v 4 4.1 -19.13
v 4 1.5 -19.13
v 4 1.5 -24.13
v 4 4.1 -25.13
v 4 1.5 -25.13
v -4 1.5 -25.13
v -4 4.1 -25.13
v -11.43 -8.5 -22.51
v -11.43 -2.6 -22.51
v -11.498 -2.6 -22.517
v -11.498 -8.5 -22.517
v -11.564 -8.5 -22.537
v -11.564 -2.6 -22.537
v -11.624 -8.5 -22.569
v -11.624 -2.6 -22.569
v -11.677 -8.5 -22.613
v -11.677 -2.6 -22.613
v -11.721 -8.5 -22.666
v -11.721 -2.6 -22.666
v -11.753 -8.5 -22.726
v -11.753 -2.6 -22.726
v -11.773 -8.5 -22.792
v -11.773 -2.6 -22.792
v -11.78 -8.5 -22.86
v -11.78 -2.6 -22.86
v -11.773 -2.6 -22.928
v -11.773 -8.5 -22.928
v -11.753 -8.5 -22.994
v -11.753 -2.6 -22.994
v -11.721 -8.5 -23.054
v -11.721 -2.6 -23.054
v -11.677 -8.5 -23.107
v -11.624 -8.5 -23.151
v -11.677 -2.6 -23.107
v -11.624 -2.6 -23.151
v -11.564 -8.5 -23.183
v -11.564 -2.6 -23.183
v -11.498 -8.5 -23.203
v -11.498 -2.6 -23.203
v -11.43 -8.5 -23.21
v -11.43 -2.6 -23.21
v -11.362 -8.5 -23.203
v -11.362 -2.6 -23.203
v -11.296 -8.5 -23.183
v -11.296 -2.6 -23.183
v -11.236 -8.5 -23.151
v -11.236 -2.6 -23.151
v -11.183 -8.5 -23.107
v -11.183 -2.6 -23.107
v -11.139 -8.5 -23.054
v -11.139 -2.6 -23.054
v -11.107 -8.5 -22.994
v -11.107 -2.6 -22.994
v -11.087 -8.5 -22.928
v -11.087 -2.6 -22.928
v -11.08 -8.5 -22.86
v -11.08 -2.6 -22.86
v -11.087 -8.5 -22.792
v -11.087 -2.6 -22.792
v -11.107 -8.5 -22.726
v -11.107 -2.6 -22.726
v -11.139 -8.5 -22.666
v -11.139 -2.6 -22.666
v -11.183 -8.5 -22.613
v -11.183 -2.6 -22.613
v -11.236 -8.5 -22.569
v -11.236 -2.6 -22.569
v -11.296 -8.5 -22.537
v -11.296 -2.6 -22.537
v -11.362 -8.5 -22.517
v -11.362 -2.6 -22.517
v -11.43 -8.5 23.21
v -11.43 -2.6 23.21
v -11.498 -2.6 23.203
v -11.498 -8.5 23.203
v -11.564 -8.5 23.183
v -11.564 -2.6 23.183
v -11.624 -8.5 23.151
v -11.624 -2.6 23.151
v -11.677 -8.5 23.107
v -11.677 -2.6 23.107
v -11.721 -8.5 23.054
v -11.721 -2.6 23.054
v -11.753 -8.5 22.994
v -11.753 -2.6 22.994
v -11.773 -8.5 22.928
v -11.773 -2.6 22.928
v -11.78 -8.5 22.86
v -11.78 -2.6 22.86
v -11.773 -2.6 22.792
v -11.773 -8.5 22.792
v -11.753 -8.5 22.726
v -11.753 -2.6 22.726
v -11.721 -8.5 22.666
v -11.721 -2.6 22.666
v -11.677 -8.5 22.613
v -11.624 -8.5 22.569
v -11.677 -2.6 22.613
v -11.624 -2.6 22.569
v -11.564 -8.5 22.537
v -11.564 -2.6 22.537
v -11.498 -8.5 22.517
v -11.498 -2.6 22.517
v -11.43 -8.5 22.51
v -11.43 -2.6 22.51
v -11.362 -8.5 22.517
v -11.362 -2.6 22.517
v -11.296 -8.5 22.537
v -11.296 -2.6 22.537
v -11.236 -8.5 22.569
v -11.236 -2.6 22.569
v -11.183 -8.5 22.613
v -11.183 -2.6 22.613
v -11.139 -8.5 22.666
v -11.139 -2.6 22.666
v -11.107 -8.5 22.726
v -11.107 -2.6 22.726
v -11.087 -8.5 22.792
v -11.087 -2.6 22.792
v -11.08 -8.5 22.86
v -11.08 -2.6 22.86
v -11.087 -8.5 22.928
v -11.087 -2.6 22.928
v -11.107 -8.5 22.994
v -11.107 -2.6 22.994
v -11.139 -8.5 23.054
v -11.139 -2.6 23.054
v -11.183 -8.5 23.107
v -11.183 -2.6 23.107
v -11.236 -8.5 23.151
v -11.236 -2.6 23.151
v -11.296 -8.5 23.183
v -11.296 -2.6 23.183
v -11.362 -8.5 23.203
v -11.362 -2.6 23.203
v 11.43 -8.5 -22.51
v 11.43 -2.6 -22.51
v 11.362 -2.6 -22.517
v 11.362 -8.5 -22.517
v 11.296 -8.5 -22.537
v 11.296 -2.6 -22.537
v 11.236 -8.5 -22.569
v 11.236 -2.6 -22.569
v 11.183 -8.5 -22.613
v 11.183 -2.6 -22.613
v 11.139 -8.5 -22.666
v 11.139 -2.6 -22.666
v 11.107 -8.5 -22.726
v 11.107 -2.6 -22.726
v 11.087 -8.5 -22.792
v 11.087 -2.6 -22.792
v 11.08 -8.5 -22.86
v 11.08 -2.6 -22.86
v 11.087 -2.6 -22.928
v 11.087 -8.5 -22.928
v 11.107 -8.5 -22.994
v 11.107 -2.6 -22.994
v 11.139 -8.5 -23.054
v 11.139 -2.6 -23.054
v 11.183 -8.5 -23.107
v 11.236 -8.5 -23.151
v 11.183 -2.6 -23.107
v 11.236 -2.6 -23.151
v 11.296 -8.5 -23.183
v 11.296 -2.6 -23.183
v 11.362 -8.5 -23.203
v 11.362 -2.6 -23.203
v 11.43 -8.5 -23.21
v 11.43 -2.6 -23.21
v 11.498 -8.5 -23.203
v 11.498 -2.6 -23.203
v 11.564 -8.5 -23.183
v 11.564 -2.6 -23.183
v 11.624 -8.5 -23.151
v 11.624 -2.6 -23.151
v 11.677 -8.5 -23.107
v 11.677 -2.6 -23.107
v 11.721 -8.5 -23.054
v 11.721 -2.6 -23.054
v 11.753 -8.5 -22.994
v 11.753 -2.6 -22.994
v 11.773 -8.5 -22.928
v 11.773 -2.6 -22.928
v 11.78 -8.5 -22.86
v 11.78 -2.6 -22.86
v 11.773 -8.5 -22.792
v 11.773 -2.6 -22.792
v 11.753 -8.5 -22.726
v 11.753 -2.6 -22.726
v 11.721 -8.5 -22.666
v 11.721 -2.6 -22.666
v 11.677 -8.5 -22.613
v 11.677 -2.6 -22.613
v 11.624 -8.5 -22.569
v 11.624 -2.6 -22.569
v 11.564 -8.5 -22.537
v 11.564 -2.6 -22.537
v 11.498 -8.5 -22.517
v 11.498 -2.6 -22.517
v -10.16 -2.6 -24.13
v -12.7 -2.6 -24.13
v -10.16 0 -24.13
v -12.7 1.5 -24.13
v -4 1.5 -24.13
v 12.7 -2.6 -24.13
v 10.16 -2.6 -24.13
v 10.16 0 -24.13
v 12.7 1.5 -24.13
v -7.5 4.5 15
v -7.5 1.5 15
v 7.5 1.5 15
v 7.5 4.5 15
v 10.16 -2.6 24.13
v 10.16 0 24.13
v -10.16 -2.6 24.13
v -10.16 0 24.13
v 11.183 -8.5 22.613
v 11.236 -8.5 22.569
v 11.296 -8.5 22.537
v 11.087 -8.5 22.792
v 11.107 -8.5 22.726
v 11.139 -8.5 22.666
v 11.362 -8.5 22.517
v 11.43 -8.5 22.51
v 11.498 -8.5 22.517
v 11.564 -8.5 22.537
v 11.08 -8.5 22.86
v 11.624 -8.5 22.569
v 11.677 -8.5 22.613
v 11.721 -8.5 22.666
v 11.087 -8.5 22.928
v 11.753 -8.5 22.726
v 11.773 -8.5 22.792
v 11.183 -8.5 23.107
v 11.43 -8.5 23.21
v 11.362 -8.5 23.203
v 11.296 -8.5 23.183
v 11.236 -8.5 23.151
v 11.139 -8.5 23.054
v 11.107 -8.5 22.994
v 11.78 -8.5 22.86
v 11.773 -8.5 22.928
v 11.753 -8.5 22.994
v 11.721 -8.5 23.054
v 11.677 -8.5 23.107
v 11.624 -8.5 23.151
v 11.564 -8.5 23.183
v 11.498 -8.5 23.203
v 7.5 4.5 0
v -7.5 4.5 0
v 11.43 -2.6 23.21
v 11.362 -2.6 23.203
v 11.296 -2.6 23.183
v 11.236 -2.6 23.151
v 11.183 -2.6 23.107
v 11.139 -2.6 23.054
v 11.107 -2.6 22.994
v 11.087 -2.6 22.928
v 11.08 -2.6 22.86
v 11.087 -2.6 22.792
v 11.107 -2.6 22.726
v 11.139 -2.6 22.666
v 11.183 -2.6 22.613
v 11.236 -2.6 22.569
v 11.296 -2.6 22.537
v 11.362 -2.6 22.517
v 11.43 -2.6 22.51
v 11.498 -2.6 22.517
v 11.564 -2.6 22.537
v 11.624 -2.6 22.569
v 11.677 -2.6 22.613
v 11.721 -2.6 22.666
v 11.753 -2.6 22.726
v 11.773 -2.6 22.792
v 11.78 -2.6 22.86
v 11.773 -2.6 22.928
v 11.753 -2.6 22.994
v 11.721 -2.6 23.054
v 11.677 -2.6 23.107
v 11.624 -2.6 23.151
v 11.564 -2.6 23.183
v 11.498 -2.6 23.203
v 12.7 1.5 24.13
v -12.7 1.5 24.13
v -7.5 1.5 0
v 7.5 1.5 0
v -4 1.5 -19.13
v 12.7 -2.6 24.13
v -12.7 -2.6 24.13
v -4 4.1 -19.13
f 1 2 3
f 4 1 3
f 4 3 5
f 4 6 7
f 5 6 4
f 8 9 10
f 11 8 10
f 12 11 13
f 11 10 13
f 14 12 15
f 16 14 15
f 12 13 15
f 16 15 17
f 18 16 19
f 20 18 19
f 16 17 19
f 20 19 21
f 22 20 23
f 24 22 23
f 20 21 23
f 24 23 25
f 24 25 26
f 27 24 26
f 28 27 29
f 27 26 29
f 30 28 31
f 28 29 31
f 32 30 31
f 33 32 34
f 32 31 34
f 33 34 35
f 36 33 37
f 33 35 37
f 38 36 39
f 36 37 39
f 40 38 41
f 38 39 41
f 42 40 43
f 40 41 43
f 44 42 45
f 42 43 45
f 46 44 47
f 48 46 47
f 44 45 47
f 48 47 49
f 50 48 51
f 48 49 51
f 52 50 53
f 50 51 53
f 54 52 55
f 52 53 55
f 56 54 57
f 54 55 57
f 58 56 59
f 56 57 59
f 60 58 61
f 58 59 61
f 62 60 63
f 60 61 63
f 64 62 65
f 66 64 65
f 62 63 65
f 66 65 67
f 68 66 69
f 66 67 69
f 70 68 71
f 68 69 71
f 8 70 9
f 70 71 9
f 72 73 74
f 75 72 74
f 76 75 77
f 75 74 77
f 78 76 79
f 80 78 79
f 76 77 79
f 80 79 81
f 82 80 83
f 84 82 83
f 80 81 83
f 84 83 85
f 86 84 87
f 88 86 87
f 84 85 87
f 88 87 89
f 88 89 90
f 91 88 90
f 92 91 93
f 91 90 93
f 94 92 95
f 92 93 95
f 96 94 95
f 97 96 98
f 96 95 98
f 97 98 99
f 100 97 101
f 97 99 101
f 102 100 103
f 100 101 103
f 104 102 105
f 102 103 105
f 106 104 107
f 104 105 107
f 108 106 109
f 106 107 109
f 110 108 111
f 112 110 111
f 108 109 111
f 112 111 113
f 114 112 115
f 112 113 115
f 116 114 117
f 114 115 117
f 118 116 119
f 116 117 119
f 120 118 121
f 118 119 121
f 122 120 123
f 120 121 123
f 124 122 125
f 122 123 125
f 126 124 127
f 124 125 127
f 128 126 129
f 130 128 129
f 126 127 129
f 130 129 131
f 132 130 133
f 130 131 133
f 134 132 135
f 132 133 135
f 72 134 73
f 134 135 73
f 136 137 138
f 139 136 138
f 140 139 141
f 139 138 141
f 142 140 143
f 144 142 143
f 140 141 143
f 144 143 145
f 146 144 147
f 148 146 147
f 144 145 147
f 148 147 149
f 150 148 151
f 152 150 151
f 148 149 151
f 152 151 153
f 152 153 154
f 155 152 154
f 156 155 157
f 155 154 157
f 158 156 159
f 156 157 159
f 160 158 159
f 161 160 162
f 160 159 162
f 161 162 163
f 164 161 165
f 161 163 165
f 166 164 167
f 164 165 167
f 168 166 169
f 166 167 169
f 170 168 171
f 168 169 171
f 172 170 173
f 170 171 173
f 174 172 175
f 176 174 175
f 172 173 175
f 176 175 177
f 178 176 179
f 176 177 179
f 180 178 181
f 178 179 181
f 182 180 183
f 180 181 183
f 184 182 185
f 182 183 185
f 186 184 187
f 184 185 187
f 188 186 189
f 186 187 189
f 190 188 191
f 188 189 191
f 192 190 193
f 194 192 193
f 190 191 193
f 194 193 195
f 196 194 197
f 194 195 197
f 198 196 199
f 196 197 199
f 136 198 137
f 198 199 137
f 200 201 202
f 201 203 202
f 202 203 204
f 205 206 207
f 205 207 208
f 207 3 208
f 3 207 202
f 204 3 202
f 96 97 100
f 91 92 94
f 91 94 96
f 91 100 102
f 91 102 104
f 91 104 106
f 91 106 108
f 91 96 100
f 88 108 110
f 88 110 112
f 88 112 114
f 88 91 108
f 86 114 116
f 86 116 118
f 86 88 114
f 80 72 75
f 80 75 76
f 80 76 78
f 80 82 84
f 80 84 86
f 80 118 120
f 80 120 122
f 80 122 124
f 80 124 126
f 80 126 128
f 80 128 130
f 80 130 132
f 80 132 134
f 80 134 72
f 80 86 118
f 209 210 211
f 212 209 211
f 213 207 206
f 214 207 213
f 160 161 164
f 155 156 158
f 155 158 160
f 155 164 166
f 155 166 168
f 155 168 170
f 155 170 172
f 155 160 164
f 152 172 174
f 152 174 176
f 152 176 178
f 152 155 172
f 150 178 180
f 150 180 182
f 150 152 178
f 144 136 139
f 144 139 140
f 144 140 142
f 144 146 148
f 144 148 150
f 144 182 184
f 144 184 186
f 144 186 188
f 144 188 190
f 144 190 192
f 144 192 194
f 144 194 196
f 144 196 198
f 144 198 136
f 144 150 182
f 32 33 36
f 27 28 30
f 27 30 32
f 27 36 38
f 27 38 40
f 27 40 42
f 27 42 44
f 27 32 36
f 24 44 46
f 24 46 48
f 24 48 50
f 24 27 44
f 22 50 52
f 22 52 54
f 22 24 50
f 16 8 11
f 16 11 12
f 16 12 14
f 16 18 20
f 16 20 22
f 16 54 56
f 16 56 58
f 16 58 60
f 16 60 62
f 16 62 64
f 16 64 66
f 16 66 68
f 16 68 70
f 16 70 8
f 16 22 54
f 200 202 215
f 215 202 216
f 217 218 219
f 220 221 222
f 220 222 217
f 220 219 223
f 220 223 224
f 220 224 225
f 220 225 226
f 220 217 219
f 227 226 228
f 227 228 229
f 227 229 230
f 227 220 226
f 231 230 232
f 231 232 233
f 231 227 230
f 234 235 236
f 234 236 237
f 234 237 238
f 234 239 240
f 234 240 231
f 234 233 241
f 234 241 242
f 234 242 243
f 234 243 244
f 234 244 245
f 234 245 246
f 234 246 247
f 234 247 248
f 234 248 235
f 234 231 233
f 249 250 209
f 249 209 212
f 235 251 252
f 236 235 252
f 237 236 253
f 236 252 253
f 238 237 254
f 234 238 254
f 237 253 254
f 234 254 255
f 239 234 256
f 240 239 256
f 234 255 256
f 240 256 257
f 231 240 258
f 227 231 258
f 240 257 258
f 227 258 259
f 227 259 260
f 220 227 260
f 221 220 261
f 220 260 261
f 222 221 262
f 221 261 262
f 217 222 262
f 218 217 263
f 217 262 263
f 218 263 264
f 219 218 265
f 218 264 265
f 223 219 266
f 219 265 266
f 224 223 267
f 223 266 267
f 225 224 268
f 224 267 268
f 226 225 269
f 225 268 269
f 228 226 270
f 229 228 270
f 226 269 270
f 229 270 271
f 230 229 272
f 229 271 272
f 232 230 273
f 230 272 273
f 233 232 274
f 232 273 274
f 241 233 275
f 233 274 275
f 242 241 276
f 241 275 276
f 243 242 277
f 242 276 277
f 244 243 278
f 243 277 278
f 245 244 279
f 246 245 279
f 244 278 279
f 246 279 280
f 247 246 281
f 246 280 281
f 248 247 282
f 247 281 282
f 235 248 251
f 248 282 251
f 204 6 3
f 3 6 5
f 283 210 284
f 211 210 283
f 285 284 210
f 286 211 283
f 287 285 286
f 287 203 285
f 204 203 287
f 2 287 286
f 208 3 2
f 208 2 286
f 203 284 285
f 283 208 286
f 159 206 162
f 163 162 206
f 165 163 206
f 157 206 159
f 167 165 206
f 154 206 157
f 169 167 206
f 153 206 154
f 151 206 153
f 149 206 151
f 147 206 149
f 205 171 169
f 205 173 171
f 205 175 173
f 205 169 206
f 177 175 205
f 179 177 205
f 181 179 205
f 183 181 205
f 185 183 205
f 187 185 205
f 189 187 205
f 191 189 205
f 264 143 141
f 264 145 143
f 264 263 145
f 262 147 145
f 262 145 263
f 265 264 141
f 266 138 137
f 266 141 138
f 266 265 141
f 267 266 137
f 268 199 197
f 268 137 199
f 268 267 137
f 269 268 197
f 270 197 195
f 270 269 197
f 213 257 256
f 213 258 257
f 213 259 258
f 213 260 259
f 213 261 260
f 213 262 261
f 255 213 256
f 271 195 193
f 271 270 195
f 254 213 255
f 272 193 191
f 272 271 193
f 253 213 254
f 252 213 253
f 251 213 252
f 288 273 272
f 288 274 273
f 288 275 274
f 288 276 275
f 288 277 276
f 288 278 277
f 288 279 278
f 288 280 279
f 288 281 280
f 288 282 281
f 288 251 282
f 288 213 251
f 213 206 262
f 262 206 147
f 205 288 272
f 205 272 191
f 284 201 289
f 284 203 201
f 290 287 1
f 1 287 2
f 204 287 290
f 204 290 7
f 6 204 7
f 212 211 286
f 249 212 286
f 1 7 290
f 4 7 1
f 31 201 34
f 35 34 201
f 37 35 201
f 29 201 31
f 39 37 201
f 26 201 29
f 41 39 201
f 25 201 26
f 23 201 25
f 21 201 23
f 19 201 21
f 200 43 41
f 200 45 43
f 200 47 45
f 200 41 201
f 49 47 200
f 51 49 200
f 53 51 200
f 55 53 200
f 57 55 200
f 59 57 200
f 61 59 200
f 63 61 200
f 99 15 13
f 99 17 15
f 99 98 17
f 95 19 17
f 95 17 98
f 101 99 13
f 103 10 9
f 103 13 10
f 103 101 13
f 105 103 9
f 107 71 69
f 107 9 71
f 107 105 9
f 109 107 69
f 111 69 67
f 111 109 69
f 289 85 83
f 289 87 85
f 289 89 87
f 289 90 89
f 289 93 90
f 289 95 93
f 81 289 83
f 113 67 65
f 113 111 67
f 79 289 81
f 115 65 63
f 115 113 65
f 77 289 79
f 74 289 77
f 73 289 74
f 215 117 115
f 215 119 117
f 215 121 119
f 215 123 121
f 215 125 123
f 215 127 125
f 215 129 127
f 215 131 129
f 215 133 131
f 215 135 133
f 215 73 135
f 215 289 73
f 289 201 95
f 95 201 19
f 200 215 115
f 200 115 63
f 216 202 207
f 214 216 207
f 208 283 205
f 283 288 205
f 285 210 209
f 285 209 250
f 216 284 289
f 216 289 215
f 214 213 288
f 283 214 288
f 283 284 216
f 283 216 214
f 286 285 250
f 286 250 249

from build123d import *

# Parameters (mm, degrees)
SKETCH1_W           = 25.4
SKETCH1_H           = 48.26
BOSS_EXTRUDE1_DEPTH = 1.5
SKETCH2_W           = 15
SKETCH2_H           = 15
BOSS_EXTRUDE2_DEPTH = 3
SKETCH3_W           = 8
SKETCH3_H           = 6
BOSS_EXTRUDE3_DEPTH = 2.6
SKETCH4_W           = 2.54
SKETCH4_H           = 48.26
BOSS_EXTRUDE4_DEPTH = 2.6
SKETCH5_R           = 0.35
BOSS_EXTRUDE5_DEPTH = 5.9


with BuildPart() as part:
    # Sketch1 → Boss-Extrude1 (new body)
    with BuildSketch(Plane(origin=(0, 0, 0), x_dir=(1, 0, 0), z_dir=(0, 1, 0))):
        Rectangle(SKETCH1_W, SKETCH1_H)
    extrude(amount=BOSS_EXTRUDE1_DEPTH)

    # Sketch2 → Boss-Extrude2 (add)
    with BuildSketch(Plane(origin=(0, 1.5, 0), x_dir=(1, 0, 0), z_dir=(0, 1, 0))):
        with Locations((0, -7.5)):
            Rectangle(SKETCH2_W, SKETCH2_H)
    extrude(amount=BOSS_EXTRUDE2_DEPTH)

    # Sketch3 → Boss-Extrude3 (add)
    with BuildSketch(Plane(origin=(0, 1.5, 0), x_dir=(1, 0, 0), z_dir=(0, 1, 0))):
        with Locations((0, 22.13)):
            Rectangle(SKETCH3_W, SKETCH3_H)
    extrude(amount=BOSS_EXTRUDE3_DEPTH)

    # Sketch4 → Boss-Extrude4 (add)
    with BuildSketch(Plane.XZ):
        with Locations((-11.43, 0)):
            Rectangle(SKETCH4_W, SKETCH4_H)
        with Locations((11.43, 0)):
            Rectangle(SKETCH4_W, SKETCH4_H)
    extrude(amount=BOSS_EXTRUDE4_DEPTH)

    # Sketch5 → Boss-Extrude5 (add)
    with BuildSketch(Plane.XZ.offset(2.6)):
        with Locations(Location((11.43, -22.86, 0), (0, 0, 90))):
            Circle(SKETCH5_R)
        with Locations(Location((-11.43, -22.86, 0), (0, 0, 90))):
            Circle(SKETCH5_R)
        with Locations(Location((-11.43, 22.86, 0), (0, 0, 90))):
            Circle(SKETCH5_R)
        with Locations(Location((11.43, 22.86, 0), (0, 0, 90))):
            Circle(SKETCH5_R)
    extrude(amount=BOSS_EXTRUDE5_DEPTH)


solid = part.part
